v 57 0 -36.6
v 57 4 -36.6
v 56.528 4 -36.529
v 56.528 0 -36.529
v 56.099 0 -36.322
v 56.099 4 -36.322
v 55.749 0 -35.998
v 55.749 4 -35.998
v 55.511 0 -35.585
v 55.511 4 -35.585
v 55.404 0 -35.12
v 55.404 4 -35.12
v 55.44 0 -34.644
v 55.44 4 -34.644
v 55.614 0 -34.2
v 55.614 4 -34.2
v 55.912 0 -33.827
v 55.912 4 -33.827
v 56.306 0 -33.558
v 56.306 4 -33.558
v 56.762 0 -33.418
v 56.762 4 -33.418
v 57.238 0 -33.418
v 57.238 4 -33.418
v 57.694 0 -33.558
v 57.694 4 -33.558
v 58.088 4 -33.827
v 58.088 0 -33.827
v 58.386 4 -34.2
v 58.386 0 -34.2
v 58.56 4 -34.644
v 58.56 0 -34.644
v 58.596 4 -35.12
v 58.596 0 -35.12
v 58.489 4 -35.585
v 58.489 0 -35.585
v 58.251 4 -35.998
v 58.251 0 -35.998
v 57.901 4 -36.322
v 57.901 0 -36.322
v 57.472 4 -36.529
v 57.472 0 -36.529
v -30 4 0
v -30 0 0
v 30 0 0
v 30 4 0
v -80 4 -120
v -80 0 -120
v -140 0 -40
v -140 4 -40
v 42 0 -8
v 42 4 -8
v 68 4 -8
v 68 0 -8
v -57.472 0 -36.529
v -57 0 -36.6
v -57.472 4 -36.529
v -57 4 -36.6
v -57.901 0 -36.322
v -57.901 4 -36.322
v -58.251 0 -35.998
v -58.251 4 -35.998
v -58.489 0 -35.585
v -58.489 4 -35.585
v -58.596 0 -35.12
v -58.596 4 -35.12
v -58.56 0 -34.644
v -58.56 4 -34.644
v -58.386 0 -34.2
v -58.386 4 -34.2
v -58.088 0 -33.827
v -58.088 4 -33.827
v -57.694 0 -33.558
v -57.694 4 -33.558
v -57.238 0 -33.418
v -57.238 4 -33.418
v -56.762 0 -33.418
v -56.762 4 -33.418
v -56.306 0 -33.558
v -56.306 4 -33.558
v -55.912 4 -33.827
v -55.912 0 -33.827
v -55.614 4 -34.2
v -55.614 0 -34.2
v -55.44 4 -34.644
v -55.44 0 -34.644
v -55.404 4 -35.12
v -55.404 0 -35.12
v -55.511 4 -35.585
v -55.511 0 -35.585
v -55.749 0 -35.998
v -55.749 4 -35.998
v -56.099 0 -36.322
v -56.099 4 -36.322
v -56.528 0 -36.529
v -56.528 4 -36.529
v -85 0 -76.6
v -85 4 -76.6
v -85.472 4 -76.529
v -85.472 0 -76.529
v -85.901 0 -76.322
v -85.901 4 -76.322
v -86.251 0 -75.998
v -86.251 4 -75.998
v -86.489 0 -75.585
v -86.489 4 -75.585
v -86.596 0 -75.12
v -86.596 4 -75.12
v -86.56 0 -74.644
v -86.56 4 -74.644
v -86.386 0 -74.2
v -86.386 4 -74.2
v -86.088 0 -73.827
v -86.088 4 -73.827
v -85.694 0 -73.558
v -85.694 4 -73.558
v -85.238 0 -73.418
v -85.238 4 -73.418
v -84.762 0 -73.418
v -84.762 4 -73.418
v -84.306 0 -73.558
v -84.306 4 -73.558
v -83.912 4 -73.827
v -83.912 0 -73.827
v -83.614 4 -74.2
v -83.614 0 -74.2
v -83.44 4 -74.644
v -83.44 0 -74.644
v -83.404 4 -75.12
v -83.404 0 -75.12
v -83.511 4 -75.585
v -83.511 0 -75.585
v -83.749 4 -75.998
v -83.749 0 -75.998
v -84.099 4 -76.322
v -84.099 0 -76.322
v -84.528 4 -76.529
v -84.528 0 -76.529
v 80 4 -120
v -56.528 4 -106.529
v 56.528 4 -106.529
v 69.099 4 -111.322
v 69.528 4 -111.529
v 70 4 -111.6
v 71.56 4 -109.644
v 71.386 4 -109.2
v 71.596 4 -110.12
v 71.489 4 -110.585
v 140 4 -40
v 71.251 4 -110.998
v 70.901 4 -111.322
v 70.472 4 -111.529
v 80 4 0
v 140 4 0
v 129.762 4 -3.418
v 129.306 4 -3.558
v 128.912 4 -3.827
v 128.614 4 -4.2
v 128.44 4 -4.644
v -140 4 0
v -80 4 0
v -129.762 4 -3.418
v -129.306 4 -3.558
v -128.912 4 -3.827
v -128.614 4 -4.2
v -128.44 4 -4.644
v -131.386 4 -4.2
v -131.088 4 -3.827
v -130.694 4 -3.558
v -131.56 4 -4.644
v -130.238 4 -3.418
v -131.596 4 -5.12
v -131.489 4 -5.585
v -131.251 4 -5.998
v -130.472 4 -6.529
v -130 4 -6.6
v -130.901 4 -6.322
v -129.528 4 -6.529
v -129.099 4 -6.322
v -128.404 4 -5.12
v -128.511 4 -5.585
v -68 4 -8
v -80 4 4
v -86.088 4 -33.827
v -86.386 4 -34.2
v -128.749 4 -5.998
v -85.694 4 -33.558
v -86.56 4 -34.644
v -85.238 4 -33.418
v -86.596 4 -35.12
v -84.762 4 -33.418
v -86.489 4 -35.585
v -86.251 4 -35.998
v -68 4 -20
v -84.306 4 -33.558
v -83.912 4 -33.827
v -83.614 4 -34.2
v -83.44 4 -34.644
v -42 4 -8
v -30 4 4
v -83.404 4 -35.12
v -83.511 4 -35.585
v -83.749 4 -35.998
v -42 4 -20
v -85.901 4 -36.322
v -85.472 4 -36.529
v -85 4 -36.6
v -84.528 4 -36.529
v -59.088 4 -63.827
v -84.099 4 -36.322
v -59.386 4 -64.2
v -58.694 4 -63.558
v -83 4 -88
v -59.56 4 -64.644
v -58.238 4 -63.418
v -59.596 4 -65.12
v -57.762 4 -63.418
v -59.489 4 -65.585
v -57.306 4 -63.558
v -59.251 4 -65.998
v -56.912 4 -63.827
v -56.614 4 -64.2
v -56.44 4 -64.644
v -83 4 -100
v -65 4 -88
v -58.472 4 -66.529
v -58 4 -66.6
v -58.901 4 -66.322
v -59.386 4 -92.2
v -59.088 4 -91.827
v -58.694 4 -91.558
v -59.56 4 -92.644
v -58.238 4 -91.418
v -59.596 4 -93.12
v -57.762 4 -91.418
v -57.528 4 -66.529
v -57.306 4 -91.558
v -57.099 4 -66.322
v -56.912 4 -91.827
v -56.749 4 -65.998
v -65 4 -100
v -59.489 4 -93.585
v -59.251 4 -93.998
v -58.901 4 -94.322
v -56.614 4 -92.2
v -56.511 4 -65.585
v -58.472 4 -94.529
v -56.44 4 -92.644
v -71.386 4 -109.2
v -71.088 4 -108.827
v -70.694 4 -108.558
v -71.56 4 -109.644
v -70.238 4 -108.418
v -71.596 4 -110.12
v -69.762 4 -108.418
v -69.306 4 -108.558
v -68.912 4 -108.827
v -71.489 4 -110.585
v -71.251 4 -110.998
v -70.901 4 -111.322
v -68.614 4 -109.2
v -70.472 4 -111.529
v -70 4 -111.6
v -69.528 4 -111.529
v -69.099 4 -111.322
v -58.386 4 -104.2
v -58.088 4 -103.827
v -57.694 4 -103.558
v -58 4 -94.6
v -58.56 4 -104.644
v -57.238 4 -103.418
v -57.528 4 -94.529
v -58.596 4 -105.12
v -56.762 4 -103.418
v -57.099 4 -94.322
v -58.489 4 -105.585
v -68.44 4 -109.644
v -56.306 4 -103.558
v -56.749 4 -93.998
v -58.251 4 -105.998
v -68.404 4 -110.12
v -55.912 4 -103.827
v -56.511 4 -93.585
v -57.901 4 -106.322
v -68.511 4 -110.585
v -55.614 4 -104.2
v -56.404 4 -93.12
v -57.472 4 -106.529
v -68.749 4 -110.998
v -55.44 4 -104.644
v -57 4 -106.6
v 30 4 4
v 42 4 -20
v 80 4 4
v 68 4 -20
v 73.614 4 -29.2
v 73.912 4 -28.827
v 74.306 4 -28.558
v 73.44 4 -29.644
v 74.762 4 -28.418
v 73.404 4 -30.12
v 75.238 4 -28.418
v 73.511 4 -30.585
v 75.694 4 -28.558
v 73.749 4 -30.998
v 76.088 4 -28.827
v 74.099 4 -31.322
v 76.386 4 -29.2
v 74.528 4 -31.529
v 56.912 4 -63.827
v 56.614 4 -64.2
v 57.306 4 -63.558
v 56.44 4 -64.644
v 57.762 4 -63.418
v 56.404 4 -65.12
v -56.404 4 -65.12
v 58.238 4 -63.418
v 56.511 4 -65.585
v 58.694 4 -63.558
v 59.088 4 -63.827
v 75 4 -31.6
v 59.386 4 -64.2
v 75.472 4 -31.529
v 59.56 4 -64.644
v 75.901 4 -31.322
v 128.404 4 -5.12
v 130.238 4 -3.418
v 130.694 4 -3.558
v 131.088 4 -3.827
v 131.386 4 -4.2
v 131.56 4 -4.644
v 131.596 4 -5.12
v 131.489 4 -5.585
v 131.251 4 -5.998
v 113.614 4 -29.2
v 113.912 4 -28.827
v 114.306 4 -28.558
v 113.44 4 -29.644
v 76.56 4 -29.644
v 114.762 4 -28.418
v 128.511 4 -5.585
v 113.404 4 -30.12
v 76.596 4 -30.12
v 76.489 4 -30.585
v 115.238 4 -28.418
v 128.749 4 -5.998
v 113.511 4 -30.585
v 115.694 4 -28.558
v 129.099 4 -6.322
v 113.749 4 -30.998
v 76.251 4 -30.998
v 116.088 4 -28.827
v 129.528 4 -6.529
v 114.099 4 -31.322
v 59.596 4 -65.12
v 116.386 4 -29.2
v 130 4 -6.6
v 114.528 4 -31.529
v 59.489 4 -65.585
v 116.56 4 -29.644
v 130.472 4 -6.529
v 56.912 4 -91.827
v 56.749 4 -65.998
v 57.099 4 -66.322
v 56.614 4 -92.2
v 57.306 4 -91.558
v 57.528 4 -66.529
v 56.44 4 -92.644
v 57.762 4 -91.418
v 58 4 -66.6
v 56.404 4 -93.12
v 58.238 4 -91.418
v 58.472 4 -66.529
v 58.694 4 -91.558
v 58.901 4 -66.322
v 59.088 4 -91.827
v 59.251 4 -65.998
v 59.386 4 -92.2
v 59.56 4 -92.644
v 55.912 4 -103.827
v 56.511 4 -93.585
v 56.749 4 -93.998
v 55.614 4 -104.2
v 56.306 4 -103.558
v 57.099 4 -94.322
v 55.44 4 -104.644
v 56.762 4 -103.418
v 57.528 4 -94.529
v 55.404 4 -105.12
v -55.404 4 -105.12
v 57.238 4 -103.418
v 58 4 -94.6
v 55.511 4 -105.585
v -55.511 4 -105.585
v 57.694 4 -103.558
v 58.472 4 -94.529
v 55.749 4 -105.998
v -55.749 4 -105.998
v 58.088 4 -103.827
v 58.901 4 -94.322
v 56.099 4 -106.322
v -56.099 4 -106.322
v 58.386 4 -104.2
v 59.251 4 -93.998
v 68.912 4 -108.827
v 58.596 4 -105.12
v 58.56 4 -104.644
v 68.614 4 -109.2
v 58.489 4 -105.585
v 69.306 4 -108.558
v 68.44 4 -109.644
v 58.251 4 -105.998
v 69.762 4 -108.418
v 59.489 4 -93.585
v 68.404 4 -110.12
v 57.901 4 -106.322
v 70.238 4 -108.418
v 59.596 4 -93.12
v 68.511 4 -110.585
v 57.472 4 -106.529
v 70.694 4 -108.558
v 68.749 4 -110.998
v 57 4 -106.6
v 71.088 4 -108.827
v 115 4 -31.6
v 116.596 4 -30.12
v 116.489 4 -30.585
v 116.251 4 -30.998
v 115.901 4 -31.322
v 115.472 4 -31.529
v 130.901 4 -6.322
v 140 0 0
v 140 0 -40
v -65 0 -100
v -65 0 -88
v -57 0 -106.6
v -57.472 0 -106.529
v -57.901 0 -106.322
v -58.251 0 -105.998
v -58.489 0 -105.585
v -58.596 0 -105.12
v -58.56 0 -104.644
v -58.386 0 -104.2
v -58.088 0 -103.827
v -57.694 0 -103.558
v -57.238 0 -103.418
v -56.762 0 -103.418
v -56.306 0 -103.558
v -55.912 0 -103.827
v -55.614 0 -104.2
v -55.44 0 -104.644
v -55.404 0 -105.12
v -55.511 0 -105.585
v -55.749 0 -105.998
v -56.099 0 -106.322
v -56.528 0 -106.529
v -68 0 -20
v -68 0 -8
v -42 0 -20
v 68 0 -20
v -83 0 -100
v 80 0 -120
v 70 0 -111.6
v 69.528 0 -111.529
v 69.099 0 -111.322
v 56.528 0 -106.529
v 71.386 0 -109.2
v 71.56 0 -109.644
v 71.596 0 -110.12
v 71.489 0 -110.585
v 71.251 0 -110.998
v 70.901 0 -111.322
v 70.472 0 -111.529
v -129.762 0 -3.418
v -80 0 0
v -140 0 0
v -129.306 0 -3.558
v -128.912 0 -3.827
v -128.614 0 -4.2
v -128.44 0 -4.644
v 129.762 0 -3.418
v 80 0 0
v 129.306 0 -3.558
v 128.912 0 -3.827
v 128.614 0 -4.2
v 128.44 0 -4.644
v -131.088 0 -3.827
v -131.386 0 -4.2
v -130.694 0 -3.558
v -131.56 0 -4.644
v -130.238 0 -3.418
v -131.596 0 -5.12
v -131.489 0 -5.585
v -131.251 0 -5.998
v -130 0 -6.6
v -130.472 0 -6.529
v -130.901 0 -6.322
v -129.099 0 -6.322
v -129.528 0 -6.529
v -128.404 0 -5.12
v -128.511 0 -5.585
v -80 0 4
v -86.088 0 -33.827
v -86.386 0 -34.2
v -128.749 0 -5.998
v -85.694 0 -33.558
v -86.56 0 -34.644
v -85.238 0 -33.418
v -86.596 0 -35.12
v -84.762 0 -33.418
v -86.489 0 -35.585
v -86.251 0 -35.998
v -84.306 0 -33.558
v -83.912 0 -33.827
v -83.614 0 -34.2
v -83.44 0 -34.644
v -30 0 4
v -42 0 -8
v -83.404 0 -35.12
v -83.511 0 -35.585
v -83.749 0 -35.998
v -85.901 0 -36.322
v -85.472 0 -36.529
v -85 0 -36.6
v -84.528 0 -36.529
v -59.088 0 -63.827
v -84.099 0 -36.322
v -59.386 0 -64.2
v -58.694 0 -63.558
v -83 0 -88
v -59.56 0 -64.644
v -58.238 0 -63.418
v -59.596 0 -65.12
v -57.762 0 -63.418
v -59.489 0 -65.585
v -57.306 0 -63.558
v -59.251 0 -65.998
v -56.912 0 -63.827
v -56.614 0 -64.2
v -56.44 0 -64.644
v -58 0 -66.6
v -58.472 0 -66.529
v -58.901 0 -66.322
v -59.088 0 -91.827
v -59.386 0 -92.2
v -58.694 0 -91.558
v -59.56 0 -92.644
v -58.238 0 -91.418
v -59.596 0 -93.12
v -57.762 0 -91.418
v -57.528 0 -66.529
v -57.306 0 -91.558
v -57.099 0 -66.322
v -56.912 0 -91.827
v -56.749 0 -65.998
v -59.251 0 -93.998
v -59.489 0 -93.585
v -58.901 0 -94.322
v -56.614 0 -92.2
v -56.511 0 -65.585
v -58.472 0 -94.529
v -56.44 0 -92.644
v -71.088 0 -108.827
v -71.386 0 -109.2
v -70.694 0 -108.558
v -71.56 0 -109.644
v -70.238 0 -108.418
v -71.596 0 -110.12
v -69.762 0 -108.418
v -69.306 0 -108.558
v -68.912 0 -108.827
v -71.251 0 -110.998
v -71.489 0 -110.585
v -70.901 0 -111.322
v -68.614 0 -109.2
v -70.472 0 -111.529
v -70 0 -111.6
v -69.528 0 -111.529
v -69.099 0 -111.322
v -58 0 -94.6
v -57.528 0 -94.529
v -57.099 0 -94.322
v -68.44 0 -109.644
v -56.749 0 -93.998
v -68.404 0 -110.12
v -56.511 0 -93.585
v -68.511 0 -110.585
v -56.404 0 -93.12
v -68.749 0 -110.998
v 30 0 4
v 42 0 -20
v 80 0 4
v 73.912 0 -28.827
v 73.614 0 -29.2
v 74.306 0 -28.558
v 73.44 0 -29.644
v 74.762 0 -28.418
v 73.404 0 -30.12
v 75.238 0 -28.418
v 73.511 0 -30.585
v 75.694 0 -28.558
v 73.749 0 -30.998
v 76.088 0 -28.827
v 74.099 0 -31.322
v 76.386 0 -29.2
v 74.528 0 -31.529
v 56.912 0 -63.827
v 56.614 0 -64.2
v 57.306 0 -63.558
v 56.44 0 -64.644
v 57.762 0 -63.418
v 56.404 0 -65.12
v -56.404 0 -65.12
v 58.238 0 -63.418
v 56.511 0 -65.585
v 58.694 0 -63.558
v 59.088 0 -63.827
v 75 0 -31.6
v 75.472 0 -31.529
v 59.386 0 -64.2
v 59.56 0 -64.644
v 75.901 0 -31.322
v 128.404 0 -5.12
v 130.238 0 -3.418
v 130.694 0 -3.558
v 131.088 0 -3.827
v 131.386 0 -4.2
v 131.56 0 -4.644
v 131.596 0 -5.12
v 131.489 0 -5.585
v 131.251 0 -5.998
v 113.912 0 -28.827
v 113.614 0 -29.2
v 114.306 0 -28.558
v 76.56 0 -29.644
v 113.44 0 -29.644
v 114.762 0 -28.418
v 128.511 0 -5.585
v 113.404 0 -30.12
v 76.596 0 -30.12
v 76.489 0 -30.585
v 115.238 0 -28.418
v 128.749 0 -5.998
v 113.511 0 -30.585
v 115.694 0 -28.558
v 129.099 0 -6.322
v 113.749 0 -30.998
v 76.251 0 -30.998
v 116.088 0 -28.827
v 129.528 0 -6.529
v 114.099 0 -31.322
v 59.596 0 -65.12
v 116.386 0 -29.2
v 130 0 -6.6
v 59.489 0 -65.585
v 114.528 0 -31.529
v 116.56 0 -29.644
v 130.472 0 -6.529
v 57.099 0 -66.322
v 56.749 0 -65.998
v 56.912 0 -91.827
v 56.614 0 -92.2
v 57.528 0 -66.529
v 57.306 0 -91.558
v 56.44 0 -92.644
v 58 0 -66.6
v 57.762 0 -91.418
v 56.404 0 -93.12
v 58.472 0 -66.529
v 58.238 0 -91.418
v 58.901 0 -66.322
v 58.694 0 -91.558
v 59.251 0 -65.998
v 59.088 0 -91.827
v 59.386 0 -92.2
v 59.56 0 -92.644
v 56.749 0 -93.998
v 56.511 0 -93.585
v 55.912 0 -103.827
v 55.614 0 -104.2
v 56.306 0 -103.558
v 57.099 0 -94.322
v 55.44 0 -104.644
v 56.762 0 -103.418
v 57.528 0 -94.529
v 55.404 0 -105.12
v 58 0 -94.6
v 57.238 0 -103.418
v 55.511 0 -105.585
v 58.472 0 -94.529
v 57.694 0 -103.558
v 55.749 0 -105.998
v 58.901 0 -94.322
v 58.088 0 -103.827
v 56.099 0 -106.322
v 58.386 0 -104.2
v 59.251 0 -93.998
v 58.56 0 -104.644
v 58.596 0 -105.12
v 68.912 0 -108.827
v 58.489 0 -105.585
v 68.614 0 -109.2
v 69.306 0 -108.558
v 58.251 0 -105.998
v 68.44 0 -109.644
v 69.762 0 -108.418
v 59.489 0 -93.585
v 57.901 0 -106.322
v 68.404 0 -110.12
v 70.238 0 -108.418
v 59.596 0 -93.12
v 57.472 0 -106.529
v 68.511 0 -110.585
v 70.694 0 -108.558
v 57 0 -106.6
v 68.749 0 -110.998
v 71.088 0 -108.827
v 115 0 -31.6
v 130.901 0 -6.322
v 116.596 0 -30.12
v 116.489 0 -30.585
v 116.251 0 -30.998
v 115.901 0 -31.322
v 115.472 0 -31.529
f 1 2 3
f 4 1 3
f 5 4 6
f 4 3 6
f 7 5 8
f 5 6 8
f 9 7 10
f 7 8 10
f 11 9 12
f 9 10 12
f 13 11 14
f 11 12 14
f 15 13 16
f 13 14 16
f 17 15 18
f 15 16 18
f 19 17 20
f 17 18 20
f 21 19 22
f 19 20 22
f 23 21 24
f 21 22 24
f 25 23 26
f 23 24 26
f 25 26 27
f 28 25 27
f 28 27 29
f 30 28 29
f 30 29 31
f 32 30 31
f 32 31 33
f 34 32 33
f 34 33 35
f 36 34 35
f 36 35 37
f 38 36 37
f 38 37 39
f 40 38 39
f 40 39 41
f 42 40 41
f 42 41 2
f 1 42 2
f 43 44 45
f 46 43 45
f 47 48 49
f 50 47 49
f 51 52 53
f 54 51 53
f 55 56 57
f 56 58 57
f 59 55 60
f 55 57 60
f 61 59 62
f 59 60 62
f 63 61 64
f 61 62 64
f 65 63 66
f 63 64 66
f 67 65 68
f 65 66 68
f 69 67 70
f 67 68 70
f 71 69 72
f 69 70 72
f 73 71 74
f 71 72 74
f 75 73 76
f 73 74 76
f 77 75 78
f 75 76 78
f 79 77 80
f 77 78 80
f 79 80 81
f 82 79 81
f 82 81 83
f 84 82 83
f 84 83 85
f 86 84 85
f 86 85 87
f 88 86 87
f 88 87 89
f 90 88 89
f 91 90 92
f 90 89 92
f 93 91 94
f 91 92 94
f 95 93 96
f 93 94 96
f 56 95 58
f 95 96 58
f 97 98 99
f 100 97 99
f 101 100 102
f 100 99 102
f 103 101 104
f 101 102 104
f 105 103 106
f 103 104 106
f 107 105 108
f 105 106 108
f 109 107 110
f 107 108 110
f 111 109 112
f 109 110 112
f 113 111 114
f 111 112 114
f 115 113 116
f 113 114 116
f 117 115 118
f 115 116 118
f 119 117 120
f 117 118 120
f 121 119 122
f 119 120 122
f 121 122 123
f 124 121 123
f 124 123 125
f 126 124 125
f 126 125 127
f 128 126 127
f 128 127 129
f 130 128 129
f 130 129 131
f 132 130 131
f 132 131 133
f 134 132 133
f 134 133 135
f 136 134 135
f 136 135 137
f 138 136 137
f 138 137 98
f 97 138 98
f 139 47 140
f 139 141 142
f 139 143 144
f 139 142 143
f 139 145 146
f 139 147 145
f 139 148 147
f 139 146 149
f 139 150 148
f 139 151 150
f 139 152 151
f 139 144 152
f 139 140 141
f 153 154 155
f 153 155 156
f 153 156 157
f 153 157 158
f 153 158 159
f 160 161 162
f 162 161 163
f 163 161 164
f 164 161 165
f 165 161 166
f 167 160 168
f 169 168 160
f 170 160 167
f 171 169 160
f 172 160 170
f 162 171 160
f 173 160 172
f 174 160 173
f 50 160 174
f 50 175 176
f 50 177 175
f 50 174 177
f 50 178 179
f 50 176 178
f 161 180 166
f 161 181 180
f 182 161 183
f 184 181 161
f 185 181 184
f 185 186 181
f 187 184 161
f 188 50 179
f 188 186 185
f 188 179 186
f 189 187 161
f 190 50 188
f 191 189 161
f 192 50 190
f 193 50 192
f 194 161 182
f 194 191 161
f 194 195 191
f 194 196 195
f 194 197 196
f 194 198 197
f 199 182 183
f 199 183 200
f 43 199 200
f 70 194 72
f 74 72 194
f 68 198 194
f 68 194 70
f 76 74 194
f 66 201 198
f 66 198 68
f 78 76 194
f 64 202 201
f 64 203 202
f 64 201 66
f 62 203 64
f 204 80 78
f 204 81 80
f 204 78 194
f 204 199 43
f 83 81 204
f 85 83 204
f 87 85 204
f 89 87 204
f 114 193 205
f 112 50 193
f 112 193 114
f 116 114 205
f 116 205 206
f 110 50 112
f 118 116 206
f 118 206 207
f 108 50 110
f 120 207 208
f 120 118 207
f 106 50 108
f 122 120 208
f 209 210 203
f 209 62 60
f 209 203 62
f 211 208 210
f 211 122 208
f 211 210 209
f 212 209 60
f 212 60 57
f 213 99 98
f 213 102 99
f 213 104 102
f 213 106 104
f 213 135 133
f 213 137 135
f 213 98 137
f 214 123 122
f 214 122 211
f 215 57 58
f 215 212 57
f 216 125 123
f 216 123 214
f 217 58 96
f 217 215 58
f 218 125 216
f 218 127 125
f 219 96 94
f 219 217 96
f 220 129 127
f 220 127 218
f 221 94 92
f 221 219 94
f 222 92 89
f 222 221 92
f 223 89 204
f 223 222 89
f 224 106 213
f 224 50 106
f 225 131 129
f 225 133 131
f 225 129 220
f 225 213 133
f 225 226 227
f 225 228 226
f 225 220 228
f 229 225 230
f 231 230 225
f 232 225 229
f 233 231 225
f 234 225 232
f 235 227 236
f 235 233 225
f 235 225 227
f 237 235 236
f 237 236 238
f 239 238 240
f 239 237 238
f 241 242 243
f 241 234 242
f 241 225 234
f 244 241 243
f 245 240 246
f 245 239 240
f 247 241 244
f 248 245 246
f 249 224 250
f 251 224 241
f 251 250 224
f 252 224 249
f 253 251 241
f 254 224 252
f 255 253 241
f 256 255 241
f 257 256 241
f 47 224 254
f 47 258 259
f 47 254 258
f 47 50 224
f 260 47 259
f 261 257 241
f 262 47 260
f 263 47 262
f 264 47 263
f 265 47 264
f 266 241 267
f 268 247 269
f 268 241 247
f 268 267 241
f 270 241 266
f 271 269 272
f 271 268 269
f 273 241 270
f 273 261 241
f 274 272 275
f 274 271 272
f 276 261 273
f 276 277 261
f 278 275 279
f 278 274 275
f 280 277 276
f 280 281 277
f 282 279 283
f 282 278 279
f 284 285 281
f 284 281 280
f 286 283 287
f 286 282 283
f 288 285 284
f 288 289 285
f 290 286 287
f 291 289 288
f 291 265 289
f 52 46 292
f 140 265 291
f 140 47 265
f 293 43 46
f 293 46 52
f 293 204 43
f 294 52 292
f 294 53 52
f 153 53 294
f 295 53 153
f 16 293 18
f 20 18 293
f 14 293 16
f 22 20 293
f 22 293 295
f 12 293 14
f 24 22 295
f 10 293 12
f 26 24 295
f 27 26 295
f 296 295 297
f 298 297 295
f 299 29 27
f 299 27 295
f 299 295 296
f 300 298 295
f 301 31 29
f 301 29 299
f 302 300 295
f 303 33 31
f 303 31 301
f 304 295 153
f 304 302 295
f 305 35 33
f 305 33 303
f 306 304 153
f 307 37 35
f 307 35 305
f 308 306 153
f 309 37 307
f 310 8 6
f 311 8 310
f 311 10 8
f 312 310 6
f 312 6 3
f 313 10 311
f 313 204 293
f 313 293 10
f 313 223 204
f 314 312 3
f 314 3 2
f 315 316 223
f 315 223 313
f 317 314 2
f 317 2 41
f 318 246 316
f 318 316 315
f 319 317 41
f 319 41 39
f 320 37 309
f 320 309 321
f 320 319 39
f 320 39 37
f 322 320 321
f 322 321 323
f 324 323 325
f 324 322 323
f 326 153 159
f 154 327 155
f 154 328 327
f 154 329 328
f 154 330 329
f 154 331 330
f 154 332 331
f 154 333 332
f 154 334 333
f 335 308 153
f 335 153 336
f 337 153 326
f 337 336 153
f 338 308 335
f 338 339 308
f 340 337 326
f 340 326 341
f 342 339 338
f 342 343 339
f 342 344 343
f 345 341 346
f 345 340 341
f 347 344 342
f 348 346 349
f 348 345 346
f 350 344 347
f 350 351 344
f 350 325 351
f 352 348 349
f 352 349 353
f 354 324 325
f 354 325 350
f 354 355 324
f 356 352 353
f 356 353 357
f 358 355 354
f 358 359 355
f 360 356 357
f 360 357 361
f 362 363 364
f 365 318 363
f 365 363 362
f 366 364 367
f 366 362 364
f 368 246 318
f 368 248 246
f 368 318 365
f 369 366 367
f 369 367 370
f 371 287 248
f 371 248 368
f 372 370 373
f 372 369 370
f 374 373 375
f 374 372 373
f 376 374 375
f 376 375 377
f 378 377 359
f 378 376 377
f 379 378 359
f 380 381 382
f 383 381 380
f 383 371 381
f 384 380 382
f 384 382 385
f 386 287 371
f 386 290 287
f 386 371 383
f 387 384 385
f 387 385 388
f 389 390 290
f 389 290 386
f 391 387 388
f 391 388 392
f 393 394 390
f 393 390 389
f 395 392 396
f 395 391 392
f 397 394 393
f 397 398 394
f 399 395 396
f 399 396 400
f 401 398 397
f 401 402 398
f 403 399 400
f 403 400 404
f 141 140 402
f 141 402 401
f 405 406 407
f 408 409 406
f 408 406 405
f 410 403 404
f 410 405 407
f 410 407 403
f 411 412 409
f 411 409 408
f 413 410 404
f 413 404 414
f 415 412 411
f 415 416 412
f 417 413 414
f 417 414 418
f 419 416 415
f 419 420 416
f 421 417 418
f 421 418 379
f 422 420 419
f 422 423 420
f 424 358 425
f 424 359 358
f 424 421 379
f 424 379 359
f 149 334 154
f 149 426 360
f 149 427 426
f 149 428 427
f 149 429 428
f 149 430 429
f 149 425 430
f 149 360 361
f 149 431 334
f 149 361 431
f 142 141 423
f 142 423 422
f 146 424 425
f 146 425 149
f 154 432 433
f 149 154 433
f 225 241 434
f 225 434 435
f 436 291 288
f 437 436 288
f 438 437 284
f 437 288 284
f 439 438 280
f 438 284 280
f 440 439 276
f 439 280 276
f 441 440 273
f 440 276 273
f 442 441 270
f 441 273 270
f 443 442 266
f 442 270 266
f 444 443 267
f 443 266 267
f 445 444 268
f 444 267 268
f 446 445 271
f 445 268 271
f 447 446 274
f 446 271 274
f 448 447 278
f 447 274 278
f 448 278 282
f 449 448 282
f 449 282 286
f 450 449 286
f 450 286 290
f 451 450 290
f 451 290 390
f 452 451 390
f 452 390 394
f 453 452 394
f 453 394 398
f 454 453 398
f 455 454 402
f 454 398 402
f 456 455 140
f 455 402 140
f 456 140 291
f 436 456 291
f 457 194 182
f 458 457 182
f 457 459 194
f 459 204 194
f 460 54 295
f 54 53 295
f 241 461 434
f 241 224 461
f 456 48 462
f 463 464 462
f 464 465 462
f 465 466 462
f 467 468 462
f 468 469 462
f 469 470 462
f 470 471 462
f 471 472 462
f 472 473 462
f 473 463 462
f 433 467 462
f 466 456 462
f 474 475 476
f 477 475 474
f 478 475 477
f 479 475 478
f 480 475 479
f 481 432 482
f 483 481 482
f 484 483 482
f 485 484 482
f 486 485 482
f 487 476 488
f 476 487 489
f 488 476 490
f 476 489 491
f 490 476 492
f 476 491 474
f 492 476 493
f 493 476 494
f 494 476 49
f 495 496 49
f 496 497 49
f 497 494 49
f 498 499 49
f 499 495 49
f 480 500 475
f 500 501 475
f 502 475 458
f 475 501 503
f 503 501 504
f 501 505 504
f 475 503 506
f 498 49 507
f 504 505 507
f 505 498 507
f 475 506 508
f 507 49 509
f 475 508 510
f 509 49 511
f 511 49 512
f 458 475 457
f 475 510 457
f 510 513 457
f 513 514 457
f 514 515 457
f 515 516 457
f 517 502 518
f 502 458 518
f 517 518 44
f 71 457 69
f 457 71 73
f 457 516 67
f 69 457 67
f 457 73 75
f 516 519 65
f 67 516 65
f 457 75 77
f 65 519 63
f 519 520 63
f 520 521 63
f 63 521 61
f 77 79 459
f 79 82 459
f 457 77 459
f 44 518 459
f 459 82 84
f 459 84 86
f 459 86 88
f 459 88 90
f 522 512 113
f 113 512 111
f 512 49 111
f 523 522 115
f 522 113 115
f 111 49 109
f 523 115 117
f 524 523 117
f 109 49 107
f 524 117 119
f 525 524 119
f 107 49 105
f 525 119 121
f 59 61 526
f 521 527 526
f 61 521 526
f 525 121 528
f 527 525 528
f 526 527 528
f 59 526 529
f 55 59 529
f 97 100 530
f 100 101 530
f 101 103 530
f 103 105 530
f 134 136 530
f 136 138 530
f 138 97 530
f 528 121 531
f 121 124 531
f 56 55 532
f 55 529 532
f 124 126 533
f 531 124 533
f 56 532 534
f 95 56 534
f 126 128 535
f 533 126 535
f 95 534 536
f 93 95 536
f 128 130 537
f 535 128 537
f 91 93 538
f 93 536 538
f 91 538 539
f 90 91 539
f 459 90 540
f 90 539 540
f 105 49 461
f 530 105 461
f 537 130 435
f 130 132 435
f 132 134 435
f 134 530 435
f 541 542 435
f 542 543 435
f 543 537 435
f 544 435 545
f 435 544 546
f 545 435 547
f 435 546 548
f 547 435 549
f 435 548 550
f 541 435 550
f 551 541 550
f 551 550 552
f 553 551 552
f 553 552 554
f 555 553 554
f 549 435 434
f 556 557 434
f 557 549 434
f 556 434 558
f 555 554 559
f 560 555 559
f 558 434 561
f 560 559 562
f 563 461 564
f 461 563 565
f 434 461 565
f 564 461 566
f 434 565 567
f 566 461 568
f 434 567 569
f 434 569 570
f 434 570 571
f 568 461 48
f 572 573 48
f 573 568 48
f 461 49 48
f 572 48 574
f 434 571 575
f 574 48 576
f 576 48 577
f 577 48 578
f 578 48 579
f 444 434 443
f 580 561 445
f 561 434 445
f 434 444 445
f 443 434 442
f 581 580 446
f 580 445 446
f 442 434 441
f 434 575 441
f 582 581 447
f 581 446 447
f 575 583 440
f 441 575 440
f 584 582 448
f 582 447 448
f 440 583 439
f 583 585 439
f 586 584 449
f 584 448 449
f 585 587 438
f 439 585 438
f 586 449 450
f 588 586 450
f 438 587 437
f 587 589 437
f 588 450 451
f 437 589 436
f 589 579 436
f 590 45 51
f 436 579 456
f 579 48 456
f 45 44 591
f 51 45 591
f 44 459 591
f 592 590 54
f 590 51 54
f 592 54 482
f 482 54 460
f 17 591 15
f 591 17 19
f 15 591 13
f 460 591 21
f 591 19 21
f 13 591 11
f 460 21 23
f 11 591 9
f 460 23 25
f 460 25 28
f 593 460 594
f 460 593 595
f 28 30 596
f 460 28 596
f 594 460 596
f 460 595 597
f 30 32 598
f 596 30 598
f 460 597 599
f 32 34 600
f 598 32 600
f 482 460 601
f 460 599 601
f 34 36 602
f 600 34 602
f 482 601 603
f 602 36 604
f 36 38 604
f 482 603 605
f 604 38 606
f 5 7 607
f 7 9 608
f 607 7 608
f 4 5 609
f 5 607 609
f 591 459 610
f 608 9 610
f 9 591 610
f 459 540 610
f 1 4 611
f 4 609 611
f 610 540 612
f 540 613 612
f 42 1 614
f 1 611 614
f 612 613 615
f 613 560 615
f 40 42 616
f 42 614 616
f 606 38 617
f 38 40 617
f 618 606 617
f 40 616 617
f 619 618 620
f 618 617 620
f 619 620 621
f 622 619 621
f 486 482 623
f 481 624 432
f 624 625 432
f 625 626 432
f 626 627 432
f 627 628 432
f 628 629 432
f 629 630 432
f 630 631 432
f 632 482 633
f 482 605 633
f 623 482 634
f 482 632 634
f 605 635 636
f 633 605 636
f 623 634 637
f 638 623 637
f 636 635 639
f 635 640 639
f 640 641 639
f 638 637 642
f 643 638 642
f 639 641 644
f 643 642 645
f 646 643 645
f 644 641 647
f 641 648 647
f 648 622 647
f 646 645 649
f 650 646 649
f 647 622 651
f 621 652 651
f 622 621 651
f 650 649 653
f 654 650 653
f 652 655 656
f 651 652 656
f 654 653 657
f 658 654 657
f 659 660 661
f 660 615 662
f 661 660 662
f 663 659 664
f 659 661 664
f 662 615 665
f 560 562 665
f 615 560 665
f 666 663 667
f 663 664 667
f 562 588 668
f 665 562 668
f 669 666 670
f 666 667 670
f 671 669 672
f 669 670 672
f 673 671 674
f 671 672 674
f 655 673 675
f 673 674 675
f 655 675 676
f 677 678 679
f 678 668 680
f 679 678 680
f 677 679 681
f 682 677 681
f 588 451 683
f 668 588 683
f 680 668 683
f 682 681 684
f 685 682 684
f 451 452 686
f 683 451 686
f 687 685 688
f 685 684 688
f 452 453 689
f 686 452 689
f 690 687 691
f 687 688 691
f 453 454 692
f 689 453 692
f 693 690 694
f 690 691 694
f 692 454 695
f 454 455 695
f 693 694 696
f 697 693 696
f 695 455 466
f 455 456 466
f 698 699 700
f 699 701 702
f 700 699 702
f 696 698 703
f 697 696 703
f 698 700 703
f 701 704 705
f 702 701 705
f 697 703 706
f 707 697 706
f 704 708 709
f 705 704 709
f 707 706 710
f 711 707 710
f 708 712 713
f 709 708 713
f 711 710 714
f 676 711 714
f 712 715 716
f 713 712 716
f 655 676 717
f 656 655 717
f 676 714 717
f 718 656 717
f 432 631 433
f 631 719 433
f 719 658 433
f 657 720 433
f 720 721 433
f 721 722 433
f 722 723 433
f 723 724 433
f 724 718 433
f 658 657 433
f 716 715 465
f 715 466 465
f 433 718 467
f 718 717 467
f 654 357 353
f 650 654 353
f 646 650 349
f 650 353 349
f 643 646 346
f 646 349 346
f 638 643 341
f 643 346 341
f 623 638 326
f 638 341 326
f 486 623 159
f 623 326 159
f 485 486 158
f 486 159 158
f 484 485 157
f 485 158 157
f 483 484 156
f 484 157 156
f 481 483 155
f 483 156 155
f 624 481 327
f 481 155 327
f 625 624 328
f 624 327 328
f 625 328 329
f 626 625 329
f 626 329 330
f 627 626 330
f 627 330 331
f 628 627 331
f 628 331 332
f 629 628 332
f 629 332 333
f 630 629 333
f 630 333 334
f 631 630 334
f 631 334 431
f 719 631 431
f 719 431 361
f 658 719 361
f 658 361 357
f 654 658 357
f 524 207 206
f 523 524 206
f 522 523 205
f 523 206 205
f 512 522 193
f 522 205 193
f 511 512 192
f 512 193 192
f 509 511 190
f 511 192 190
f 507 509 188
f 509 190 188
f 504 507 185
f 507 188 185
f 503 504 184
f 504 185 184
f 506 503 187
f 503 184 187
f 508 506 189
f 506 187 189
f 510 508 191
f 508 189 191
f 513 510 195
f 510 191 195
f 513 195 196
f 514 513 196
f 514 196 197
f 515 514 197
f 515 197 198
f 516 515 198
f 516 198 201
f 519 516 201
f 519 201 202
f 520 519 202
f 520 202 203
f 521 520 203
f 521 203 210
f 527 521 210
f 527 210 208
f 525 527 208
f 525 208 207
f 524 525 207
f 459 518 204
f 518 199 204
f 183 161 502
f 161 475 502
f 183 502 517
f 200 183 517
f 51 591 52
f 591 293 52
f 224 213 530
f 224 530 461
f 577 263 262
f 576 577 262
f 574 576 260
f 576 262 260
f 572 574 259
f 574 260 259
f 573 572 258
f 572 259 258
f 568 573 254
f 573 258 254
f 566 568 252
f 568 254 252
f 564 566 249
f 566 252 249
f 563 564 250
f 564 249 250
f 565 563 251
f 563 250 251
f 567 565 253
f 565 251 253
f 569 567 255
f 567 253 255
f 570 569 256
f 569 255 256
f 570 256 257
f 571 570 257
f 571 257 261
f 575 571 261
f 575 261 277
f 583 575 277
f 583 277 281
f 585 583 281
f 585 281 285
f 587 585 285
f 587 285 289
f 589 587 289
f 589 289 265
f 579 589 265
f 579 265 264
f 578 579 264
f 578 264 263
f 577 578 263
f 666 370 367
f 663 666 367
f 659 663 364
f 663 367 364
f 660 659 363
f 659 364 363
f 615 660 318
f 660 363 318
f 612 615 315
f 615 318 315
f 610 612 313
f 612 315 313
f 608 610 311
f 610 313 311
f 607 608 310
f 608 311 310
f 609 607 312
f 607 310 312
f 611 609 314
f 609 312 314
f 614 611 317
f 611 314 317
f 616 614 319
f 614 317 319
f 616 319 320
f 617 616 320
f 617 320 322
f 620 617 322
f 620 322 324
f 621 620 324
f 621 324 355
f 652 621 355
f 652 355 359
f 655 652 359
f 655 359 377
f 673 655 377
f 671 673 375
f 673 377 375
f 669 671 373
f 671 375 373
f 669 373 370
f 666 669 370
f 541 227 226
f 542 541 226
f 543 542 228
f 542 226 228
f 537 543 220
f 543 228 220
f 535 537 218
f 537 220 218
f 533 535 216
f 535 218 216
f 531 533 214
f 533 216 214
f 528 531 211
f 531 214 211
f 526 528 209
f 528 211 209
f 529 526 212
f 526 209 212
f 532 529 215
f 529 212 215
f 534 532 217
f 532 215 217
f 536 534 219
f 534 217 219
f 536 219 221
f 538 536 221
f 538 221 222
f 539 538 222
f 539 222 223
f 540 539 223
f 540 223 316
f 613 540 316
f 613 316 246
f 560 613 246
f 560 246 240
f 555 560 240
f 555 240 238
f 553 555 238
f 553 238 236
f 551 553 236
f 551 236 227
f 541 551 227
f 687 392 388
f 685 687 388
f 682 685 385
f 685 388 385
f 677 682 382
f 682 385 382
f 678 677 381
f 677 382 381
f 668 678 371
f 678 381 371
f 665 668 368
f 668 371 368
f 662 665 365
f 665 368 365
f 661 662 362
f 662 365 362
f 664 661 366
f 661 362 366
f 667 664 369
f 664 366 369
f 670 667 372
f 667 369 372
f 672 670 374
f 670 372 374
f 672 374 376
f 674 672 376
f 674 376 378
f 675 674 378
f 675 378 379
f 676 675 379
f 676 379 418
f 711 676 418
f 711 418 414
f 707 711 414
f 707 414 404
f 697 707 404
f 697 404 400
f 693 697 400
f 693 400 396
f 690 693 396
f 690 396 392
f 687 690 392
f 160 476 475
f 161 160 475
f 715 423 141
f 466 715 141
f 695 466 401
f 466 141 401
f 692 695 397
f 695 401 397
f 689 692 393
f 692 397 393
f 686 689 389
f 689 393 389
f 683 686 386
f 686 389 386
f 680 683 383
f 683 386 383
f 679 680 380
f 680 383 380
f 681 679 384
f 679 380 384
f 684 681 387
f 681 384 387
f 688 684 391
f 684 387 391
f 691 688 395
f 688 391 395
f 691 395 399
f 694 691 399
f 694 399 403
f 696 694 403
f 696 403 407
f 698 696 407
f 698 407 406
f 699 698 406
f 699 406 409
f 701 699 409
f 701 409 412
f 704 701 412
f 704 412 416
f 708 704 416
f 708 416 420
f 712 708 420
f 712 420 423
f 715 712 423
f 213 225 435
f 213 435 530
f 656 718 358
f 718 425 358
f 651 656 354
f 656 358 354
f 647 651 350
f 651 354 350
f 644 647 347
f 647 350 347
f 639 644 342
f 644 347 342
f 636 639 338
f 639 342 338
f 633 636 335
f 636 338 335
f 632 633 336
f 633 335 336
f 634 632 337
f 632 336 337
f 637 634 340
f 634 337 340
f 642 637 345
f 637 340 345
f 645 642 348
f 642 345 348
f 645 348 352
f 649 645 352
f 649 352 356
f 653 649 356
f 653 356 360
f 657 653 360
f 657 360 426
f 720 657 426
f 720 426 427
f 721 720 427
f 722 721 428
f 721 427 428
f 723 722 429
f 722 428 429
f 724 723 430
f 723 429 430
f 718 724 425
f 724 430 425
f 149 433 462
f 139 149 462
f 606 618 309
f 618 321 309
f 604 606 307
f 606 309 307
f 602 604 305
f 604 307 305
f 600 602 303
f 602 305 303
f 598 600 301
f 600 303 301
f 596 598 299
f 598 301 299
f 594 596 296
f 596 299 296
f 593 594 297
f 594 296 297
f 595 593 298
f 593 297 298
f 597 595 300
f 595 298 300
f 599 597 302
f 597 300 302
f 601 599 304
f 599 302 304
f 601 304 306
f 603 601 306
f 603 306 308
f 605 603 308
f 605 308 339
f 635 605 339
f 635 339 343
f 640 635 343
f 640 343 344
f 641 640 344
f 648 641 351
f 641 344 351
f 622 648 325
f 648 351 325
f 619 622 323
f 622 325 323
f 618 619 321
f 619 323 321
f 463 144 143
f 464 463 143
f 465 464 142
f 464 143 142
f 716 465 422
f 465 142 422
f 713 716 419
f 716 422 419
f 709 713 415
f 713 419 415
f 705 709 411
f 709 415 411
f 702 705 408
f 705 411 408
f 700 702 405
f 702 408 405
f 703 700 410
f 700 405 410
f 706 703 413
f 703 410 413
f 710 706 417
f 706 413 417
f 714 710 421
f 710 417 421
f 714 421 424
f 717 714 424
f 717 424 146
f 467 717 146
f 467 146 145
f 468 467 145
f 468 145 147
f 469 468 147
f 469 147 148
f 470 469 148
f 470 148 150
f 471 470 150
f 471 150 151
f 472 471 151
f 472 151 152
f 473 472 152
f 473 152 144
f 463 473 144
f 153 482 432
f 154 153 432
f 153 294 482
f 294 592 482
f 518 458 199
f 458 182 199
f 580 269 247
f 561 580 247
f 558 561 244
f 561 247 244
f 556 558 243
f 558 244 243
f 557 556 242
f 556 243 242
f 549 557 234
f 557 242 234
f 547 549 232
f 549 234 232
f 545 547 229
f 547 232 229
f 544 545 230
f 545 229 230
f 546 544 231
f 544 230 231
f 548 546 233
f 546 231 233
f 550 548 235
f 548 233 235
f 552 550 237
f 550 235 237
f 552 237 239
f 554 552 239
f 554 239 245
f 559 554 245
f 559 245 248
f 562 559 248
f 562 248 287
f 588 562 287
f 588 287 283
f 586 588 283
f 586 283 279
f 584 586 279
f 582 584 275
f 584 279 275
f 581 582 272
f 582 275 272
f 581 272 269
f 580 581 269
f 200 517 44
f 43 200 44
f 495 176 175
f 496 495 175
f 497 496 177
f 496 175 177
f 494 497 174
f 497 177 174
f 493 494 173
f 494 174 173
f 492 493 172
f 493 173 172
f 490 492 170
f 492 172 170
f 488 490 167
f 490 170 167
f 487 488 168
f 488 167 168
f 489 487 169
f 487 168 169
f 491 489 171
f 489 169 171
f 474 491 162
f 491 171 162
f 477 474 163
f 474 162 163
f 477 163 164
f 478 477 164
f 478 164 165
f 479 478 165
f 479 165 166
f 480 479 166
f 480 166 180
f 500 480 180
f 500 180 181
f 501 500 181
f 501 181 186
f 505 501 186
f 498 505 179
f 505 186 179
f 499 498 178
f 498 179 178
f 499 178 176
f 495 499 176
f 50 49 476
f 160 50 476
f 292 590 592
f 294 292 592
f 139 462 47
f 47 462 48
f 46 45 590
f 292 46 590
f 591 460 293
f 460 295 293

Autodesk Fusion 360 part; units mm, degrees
sketch "スケッチ1" plane through (0, 0, 0) normal (0, 1, 0) x (1, 0, 0)
  line L0 (-140, 0) -> (-80, 0)
  line L1 (-80, 0) -> (-80, -4)
  line L2 (-80, -4) -> (-30, -4)
  line L3 (-30, -4) -> (-30, 0)
  line L4 (-30, 0) -> (30, 0)
  line L5 (30, 0) -> (30, -4)
  line L6 (30, -4) -> (80, -4)
  line L7 (80, -4) -> (80, 0)
  line L8 (80, 0) -> (140, 0)
  line L9 (140, 0) -> (140, 40)
  line L10 (140, 40) -> (80, 120)
  line L11 (80, 120) -> (-80, 120)
  line L12 (-80, 120) -> (-140, 40)
  line L13 (-140, 40) -> (-140, 0)
  line L14 (-57, 105) -> (57, 105)
  line L15 (75, 30) -> (115, 30)
  line L16 (-85, 35) -> (-85, 75)
  line L17 (-70, 110) -> (70, 110)
  line L18 (-130, 5) -> (130, 5)
  line L19 (-57, 105) -> (-57, 35)
  line L20 (-57, 35) -> (57, 35)
  line L21 (57, 105) -> (57, 35)
  line L22 (-58, 65) -> (58, 65)
  line L23 (58, 65) -> (58, 93)
  line L24 (58, 93) -> (-58, 93)
  line L25 (-58, 93) -> (-58, 65)
  point P0 (0, 120)
  point P1 (0, 105)
  point P2 (0, 110)
  point P3 (0, 5)
  point P4 (0, 65)
  dimension "d1" = 280
  dimension "d2" = 60
  dimension "d3" = 50
  dimension "d4" = 4
  dimension "d5" = 80
  dimension "d6" = 40
  dimension "d7" = 160
  dimension "d22" = 114
  dimension "d23" = 15
  dimension "d27" = 40
  dimension "d28" = 30
  dimension "d29" = 25
  dimension "d30" = 40
  dimension "d31" = 35
  dimension "d32" = 55
  dimension "d36" = 140
  dimension "d37" = 10
  dimension "d38" = 5
  dimension "d39" = 260
  dimension "d40" = 70
  dimension "d41" = 116
  dimension "d42" = 28
  dimension "d43" = 65
extrude "押し出し1" add sketch "スケッチ1" along normal blind 4 contours L0 L1 L2 L3 L4 L5 L6 L7 L8 L9 L10 L11 L12 L13 | L14 L19 L21 L24 | L19 L21 L22 L24 | L19 L22 L24 L25 | L21 L22 L23 L24 | L19 L20 L21 L22
hole "穴1" at (57, 0, -105) at (-57, 0, -105) at (-85, 0, -75) at (-85, 0, -35) at (75, 0, -30) at (115, 0, -30) at (-70, 0, -110) at (70, 0, -110) at (-130, 0, -5) at (130, 0, -5) at (-57, 0, -35) at (57, 0, -35) at (-58, 0, -93) at (-58, 0, -65) at (58, 0, -93) at (58, 0, -65) direction (0, 1, 0) diameter 3.2 end through all
sketch "スケッチ2" plane through (0, 4, 0) normal (0, 1, 0) x (-1, 0, 0)
  circle A0 centre (-58, -93) radius 1.6
  circle A1 centre (58, -93) radius 1.6
  circle A2 centre (57, -35) radius 1.6
  circle A3 centre (130, -5) radius 1.6
  circle A4 centre (70, -110) radius 1.6
  circle A5 centre (-75, -30) radius 1.6
  circle A6 centre (85, -75) radius 1.6
  circle A7 centre (-57, -105) radius 1.6
  circle A8 centre (57, -105) radius 1.6
  circle A9 centre (85, -35) radius 1.6
  circle A10 centre (-115, -30) radius 1.6
  circle A11 centre (-70, -110) radius 1.6
  circle A12 centre (-130, -5) radius 1.6
  circle A13 centre (-57, -35) radius 1.6
  circle A14 centre (58, -65) radius 1.6
  circle A15 centre (-58, -65) radius 1.6
  line L0 (140, -40) -> (140, 0)
  line L1 (140, 0) -> (80, 0)
  line L2 (80, 0) -> (80, 4)
  line L3 (80, 4) -> (30, 4)
  line L4 (30, 4) -> (30, 0)
  line L5 (30, 0) -> (-30, 0)
  line L6 (-30, 0) -> (-30, 4)
  line L7 (-30, 4) -> (-80, 4)
  line L8 (-80, 4) -> (-80, 0)
  line L9 (-80, 0) -> (-140, 0)
  line L10 (-140, 0) -> (-140, -40)
  line L11 (-140, -40) -> (-80, -120)
  line L12 (-80, -120) -> (80, -120)
  line L13 (80, -120) -> (140, -40)
  line L14 (68, -8) -> (42, -8)
  line L15 (42, -8) -> (42, -20)
  line L16 (42, -20) -> (68, -20)
  line L17 (68, -20) -> (68, -8)
  line L18 (-42, -8) -> (-68, -8)
  line L19 (-68, -8) -> (-68, -20)
  line L20 (-68, -20) -> (-42, -20)
  line L21 (-42, -20) -> (-42, -8)
  line L22 (83, -100) -> (65, -100)
  line L23 (65, -100) -> (65, -88)
  line L24 (65, -88) -> (83, -88)
  line L25 (83, -88) -> (83, -100)
  line L26 (55, 4) -> (55, -8)
  line L27 (-55, 4) -> (-55, -8)
  dimension "d44" = 18
  dimension "d45" = 12
  dimension "d46" = 12
  dimension "d47" = 88
  dimension "d48" = 65
  dimension "d50" = 26
extrude "押し出し2" cut sketch "スケッチ2" against normal through all contours L14 L15 L16 L17 | L18 L19 L20 L21 | L22 L23 L24 L25
